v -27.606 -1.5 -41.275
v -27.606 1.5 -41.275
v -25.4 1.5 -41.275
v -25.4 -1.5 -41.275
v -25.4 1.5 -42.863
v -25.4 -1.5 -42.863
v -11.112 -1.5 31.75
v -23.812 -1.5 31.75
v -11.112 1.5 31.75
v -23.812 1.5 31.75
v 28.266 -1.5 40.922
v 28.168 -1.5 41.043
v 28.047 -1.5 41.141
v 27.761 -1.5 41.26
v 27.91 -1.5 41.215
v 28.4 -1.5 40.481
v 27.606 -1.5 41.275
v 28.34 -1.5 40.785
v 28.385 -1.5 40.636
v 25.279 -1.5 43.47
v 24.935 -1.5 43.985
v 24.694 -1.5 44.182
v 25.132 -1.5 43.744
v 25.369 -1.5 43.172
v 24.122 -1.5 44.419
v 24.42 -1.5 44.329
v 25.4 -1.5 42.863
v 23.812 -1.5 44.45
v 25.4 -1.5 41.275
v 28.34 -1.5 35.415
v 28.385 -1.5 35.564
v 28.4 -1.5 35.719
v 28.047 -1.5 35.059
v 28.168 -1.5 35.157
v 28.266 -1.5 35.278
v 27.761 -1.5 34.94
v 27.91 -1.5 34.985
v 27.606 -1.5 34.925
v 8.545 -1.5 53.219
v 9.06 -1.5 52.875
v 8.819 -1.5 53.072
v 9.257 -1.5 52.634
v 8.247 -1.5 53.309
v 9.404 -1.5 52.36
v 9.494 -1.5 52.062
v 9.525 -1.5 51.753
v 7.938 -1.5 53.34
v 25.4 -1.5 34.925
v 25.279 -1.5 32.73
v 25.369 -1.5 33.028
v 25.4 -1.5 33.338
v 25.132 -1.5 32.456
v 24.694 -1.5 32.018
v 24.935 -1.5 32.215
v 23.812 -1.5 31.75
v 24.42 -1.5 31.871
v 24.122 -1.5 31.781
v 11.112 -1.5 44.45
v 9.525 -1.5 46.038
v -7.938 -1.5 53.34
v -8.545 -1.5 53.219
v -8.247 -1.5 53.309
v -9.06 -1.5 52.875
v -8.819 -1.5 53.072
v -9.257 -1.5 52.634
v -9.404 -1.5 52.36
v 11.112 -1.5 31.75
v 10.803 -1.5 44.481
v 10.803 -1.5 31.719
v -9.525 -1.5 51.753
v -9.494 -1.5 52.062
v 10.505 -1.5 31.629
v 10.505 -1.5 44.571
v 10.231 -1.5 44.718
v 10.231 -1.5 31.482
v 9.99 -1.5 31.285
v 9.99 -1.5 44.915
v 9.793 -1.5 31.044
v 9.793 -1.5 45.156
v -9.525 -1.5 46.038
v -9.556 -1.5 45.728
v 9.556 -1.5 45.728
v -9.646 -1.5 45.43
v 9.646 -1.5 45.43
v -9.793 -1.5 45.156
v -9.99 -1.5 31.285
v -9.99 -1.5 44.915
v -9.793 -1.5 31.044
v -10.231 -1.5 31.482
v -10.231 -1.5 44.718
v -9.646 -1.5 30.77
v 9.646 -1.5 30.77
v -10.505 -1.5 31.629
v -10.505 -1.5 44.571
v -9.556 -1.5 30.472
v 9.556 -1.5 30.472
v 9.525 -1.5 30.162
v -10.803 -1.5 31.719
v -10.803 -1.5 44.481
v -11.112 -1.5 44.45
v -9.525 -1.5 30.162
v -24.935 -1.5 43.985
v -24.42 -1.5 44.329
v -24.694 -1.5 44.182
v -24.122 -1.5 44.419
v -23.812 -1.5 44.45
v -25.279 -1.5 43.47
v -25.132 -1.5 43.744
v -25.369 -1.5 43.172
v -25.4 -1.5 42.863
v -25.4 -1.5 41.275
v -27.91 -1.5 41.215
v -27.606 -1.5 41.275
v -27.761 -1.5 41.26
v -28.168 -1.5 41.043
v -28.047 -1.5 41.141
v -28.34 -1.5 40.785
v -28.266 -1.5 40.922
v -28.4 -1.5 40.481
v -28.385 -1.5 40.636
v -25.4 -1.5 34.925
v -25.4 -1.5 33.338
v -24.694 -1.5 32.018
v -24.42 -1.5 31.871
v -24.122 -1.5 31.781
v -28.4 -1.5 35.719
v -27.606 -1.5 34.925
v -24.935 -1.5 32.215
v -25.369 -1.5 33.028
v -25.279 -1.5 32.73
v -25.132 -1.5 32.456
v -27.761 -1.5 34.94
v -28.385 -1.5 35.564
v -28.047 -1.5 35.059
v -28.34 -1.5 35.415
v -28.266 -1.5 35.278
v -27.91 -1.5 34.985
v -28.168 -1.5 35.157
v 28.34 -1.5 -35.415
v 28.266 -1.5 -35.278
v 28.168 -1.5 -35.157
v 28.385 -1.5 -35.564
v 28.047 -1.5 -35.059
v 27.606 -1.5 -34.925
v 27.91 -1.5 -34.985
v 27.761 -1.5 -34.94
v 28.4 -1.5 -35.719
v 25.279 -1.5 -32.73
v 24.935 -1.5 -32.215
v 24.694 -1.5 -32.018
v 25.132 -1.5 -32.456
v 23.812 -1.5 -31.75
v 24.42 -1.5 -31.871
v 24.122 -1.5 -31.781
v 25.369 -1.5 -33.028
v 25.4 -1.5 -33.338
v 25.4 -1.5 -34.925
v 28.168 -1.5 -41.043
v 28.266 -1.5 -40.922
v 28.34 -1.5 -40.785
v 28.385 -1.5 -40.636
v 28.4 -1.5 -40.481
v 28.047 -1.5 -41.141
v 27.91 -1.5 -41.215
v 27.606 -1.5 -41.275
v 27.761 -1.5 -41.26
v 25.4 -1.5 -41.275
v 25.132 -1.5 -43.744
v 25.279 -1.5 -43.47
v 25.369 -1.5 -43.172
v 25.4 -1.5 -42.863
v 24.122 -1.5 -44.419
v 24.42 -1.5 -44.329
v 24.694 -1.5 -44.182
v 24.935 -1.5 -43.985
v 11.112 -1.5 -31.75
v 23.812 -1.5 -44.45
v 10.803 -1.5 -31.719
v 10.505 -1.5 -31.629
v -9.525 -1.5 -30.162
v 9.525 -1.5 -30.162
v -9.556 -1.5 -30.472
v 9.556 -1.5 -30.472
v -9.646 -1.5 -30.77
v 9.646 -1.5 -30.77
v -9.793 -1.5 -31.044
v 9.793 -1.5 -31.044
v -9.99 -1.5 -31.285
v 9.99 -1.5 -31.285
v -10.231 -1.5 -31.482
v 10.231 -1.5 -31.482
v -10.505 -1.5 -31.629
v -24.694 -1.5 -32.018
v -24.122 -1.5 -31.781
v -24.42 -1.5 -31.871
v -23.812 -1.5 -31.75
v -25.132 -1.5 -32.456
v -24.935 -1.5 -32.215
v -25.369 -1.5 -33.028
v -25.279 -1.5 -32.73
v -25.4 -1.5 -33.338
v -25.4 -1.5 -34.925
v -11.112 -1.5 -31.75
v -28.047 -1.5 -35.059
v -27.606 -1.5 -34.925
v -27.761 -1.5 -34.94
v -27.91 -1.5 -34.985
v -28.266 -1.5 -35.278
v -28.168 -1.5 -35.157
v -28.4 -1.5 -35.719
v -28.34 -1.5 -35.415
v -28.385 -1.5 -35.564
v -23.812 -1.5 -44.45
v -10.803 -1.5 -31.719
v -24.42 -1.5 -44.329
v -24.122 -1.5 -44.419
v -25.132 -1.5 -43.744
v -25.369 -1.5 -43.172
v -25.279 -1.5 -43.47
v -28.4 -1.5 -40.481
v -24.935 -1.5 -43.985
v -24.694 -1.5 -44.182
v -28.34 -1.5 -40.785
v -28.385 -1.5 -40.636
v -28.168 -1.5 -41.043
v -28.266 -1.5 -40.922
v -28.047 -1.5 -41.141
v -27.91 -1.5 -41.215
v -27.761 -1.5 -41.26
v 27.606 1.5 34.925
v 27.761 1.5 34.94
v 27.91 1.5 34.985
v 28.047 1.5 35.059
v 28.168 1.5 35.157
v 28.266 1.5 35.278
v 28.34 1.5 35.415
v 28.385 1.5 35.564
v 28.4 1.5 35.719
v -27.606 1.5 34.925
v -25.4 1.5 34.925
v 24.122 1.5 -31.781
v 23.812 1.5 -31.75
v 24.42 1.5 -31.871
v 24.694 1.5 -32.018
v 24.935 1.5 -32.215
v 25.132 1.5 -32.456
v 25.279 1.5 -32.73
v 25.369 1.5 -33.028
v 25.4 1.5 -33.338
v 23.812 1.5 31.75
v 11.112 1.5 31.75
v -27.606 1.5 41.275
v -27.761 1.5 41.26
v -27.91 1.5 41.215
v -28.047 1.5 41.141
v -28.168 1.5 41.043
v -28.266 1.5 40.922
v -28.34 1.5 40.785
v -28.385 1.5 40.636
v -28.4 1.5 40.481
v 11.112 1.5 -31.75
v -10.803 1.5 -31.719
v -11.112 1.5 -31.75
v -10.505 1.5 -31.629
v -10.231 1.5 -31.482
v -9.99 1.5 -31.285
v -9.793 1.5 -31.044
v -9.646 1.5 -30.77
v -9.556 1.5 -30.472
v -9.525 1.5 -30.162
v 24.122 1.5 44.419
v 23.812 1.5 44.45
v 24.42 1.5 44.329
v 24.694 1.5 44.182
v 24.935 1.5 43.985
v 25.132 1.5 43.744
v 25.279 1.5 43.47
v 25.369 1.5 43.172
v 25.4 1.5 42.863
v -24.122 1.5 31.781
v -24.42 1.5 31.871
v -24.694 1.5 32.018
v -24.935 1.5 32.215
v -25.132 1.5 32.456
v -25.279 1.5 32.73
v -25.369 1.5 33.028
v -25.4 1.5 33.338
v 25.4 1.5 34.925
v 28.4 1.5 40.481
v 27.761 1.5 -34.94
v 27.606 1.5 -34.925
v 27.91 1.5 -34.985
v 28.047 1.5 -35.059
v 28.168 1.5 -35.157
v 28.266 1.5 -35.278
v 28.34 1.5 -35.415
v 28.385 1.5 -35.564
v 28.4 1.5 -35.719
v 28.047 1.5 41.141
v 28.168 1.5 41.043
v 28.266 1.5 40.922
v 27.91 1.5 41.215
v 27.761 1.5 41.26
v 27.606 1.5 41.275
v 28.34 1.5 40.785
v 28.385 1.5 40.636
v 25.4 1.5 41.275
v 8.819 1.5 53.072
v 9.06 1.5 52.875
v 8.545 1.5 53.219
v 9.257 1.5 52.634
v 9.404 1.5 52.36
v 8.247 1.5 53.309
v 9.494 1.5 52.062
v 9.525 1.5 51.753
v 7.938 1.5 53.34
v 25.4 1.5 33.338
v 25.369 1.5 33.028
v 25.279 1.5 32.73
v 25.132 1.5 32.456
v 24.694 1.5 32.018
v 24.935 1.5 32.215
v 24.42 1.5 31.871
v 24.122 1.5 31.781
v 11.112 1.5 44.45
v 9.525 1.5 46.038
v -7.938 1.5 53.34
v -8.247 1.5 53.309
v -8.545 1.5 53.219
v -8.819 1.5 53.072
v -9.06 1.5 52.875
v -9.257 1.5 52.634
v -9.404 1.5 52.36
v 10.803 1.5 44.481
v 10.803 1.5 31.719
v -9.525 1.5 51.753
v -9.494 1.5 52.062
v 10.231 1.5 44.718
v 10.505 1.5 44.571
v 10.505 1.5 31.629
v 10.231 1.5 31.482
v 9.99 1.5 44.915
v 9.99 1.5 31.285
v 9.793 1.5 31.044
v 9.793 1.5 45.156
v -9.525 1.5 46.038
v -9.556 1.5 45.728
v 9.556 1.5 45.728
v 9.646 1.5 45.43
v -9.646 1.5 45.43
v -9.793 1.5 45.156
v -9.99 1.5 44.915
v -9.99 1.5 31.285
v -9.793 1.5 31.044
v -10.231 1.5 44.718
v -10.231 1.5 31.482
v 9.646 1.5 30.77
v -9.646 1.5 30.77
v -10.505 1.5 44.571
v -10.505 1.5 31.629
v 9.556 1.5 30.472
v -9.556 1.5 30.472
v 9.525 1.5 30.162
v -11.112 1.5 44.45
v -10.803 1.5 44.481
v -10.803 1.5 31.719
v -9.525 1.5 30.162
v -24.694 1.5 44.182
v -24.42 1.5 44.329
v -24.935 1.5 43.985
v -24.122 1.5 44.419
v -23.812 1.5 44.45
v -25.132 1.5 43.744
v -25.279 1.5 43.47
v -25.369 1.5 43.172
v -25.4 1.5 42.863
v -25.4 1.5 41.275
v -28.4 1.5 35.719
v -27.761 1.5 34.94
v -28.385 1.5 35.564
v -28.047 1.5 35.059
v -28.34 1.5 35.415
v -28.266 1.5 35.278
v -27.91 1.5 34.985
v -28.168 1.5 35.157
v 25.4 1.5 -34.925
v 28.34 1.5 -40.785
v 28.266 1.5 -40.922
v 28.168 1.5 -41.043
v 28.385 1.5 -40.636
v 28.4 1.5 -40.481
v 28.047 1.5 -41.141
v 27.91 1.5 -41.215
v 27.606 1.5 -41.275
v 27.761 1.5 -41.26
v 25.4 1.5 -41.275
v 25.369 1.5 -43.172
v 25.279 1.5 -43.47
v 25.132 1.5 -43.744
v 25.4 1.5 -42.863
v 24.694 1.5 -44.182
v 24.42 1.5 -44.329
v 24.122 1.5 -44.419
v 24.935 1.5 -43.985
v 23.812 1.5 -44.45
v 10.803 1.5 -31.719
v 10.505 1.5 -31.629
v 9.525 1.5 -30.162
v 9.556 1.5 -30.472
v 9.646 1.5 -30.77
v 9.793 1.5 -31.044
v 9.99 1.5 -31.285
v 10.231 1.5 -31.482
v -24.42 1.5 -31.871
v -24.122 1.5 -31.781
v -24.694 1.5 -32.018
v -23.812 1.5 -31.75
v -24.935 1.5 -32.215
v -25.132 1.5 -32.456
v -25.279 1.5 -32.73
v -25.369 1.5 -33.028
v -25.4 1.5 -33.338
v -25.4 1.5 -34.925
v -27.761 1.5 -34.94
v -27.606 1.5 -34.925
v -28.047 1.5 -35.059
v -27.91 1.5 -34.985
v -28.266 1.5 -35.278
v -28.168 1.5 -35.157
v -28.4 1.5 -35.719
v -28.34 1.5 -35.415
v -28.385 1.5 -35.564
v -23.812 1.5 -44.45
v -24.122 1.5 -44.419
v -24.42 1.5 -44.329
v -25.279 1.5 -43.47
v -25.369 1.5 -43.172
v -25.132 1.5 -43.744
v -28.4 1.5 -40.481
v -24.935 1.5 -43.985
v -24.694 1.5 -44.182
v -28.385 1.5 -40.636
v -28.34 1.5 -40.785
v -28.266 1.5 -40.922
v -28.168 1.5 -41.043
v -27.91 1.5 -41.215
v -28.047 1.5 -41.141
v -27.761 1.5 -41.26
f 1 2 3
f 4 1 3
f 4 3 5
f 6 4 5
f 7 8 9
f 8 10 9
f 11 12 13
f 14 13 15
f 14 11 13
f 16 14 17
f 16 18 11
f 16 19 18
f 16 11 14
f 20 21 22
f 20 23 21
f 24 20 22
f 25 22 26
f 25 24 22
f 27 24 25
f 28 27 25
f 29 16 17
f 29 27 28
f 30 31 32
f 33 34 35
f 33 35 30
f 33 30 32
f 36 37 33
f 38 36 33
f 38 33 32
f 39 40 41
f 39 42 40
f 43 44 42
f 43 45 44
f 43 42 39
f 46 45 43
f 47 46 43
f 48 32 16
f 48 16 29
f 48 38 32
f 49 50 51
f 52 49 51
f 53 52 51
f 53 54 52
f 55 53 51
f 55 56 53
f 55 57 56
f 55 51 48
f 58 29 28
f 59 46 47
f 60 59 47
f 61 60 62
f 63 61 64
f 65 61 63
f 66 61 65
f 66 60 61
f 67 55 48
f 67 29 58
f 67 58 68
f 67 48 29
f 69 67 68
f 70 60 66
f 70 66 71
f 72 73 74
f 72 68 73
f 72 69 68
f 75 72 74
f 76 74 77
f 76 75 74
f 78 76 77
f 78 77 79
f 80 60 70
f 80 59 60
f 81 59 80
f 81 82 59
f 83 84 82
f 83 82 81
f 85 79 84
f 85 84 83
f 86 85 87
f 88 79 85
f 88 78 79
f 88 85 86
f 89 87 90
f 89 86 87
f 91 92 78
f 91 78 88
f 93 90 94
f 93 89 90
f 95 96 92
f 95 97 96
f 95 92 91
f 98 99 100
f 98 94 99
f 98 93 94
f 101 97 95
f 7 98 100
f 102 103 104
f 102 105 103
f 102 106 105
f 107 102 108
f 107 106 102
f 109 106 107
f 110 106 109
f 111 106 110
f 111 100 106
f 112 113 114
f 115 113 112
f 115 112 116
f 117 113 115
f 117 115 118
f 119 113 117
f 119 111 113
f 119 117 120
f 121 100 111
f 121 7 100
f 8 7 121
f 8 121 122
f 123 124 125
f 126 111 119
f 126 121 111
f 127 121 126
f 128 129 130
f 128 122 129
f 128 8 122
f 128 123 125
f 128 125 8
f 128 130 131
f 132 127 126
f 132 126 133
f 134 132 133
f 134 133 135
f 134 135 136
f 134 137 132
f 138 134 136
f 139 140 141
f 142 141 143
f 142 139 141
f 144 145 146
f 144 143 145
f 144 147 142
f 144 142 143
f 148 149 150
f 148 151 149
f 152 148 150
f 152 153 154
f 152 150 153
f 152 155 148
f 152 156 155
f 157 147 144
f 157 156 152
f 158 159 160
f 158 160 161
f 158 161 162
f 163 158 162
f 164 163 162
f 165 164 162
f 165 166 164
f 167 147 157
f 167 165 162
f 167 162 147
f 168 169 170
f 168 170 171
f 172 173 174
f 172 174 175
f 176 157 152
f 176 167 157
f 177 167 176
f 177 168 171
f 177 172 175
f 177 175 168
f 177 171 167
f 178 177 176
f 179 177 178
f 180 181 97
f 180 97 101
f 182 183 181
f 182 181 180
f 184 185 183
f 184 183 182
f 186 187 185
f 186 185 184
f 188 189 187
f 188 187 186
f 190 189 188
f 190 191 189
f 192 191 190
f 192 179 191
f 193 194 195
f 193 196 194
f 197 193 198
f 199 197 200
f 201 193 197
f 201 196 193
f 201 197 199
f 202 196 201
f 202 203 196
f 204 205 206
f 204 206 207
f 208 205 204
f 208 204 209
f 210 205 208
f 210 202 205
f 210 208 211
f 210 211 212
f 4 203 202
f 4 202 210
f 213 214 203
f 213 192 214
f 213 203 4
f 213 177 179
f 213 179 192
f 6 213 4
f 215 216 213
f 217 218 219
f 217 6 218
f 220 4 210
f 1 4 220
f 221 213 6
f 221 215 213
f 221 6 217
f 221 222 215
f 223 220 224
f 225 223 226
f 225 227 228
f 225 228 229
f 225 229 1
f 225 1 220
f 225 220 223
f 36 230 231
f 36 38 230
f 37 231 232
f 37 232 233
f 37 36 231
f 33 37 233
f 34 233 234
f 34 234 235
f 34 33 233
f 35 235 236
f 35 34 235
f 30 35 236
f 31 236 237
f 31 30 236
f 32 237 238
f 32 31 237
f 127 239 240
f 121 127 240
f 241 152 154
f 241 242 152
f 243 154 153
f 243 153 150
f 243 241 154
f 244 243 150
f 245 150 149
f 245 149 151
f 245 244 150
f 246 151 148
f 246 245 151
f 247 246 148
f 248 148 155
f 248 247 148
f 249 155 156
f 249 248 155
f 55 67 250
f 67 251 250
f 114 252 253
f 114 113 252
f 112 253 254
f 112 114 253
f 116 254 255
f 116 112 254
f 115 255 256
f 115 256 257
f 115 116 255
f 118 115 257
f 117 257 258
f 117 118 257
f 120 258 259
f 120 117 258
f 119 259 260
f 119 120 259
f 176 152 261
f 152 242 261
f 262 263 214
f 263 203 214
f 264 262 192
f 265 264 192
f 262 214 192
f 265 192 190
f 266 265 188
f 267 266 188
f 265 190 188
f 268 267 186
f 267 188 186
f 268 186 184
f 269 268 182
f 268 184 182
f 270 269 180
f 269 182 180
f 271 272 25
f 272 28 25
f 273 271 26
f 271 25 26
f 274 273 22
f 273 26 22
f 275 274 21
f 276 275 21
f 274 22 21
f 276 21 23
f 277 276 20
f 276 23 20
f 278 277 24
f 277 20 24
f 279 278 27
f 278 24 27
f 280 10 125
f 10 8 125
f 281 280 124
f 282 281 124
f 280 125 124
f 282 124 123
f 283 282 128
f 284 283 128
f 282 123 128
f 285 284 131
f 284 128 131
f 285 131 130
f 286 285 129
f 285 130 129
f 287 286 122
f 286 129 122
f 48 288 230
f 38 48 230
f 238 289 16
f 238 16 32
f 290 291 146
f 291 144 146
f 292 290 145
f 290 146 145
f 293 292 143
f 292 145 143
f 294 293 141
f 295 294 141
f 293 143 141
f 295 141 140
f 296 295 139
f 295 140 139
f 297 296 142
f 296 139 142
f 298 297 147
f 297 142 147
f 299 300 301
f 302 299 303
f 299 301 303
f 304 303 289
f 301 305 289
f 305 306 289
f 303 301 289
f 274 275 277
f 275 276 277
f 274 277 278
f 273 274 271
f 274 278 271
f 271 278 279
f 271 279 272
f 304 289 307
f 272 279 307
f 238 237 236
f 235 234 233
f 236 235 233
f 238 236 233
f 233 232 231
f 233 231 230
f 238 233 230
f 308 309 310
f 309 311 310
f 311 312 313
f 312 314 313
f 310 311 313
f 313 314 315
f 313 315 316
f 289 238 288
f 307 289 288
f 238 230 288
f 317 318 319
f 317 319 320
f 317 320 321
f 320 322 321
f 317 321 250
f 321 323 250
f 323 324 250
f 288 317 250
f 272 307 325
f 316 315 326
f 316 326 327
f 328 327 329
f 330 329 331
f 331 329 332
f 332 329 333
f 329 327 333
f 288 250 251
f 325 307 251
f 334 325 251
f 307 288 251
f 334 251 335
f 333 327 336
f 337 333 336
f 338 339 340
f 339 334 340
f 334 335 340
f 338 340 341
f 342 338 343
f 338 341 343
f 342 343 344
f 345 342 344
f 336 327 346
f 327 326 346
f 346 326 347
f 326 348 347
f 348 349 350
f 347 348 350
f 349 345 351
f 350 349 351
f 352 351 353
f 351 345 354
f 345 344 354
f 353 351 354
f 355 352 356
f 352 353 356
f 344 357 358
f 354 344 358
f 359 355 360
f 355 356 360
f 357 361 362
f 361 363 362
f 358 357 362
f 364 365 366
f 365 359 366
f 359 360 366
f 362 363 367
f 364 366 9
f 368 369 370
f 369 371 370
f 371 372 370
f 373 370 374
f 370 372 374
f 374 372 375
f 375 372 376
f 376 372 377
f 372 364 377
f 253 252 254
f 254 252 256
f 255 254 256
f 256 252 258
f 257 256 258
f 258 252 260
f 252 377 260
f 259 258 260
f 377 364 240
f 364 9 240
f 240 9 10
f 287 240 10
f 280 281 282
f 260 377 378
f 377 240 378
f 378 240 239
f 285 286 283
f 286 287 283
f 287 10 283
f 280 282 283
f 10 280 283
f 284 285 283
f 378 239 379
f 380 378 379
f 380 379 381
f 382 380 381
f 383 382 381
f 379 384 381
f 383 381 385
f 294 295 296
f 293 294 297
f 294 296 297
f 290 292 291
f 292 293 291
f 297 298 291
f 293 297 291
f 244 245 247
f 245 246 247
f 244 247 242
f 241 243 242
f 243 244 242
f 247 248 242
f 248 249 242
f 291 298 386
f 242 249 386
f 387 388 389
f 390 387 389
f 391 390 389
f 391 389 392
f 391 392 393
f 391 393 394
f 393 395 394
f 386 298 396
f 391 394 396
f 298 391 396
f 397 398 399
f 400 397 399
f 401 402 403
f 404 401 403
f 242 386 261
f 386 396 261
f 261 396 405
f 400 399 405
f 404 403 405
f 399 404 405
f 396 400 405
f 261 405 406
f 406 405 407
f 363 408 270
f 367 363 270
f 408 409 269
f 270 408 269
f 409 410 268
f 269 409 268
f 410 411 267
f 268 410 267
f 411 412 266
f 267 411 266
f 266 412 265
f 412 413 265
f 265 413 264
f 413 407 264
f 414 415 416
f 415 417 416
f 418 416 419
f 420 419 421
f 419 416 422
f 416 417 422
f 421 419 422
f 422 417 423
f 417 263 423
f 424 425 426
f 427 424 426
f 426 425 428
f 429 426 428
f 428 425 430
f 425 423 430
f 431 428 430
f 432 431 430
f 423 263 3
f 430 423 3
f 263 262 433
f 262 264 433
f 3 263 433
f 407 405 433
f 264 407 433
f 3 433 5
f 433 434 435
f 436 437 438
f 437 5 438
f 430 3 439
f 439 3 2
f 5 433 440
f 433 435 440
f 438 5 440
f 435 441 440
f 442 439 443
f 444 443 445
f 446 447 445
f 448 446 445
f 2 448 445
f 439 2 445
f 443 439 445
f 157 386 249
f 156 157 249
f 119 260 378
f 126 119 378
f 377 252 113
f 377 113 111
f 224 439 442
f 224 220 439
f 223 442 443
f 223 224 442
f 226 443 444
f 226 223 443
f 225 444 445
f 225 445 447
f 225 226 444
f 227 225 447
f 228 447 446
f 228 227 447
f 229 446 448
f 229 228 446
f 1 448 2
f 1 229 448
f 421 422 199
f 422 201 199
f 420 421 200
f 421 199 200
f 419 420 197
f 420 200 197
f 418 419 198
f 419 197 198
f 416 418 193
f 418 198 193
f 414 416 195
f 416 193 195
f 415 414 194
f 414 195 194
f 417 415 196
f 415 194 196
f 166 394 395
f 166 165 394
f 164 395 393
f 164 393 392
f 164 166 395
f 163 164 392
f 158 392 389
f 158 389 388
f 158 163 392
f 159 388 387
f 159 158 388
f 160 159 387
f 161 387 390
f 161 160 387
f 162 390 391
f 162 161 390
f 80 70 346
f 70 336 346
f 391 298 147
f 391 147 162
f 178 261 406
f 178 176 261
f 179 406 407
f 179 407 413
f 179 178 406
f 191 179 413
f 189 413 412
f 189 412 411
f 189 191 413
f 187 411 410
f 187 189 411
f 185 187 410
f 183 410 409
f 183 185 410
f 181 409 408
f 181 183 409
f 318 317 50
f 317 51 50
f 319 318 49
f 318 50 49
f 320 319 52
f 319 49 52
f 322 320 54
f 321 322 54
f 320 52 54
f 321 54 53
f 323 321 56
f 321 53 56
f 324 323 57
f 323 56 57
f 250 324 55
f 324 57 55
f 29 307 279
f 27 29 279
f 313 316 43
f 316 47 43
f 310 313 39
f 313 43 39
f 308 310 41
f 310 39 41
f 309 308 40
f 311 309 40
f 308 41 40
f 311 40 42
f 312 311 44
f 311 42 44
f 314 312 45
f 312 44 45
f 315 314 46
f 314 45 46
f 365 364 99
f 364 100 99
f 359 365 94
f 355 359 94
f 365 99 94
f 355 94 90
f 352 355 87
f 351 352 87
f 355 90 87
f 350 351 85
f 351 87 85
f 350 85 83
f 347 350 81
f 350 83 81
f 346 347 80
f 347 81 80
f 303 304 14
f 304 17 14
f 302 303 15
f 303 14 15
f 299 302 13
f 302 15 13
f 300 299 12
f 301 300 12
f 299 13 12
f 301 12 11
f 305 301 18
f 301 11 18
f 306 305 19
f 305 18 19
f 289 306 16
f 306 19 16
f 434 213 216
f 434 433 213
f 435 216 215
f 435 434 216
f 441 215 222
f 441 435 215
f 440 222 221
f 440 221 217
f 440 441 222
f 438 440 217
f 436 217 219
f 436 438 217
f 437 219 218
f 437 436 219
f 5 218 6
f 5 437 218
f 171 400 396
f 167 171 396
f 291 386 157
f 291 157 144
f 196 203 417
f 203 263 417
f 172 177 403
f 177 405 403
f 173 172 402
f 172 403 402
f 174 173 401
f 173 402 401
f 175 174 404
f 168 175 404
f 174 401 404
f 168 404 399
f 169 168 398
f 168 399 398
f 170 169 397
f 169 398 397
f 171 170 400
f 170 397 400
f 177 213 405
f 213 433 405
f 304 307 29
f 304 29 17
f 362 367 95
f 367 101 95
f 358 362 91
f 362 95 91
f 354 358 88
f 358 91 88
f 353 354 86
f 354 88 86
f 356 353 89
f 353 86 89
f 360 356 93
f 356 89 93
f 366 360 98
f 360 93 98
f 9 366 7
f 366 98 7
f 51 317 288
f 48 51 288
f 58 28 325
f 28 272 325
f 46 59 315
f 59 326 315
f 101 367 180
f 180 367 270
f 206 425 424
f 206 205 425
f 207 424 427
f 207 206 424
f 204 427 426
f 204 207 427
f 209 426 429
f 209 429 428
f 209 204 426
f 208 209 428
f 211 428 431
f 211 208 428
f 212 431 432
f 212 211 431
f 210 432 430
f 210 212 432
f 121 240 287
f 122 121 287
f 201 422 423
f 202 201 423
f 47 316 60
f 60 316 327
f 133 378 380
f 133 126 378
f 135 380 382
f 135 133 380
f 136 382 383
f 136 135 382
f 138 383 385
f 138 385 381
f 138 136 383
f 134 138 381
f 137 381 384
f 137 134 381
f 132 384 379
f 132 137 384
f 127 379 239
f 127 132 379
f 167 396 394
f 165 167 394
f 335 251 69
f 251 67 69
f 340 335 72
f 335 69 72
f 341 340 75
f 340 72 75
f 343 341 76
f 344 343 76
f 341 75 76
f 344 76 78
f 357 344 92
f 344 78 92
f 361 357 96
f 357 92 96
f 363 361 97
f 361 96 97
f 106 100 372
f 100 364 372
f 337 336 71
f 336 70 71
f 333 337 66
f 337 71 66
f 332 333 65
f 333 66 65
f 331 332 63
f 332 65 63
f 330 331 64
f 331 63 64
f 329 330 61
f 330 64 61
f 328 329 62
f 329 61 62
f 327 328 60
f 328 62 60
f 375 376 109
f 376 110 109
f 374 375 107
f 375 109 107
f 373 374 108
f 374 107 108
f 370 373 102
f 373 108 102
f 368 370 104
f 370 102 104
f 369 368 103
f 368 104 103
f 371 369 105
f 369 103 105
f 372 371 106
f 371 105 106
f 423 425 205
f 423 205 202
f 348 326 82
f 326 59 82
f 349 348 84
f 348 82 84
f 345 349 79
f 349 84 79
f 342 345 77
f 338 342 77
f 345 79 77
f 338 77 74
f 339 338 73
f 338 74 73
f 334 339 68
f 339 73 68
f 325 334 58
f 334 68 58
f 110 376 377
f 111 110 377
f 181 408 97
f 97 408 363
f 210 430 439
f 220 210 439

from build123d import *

# Parameters (mm, degrees)
BOSS_EXTRUDE1_DEPTH = 1.5
FILLET1_R           = 1.5875
SKETCH2_W           = 3
SKETCH2_H           = 6.35
BOSS_EXTRUDE2_DEPTH = 3
FILLET2_R           = 0.79375


with BuildPart() as part:
    # Sketch1 → Boss-Extrude1 (new, symmetric)
    with BuildSketch(Plane(origin=(0, 0, 0), x_dir=(1, 0, 0), z_dir=(0, 1, 0))):
        Polygon((25.4, 31.75), (9.525, 31.75), (9.525, -31.75), (25.4, -31.75), (25.4, -44.45), (9.525, -44.45), (9.525, -53.34), (-9.525, -53.34), (-9.525, -44.45), (-25.4, -44.45), (-25.4, -31.75), (-9.525, -31.75), (-9.525, 31.75), (-25.4, 31.75), (-25.4, 44.45), (25.4, 44.45), align=None)
    extrude(amount=BOSS_EXTRUDE1_DEPTH, both=True)

    # Fillet1
    fillet1_edges = [part.edges().sort_by_distance(p)[0] for p in [
        (25.4, 0, -44.45),
        (25.4, 0, -31.75),
        (9.525, 0, -31.75),
        (9.525, 0, 31.75),
        (25.4, 0, 31.75),
        (25.4, 0, 44.45),
        (9.525, 0, 44.45),
        (9.525, 0, 53.34),
        (-9.525, 0, 53.34),
        (-9.525, 0, 44.45),
        (-25.4, 0, 44.45),
        (-25.4, 0, 31.75),
        (-9.525, 0, 31.75),
        (-9.525, 0, -31.75),
        (-25.4, 0, -31.75),
        (-25.4, 0, -44.45),
    ]]
    fillet(fillet1_edges, radius=FILLET1_R)

    # Sketch2 → Boss-Extrude2 (add)
    with BuildSketch(Plane(origin=(0, 1.5, 0), x_dir=(1, 0, 0), z_dir=(0, 1, 0))):
        with Locations((-26.9, 38.1)):
            Rectangle(SKETCH2_W, SKETCH2_H)
        with Locations((26.9, 38.1)):
            Rectangle(SKETCH2_W, SKETCH2_H)
        with Locations((26.9, -38.1)):
            Rectangle(SKETCH2_W, SKETCH2_H)
        with Locations((-26.9, -38.1)):
            Rectangle(SKETCH2_W, SKETCH2_H)
    extrude(amount=-BOSS_EXTRUDE2_DEPTH)

    # Fillet2
    fillet2_edges = [part.edges().sort_by_distance(p)[0] for p in [
        (-28.4, 0, 41.275),
        (-28.4, 0, 34.925),
        (28.4, 0, 34.925),
        (28.4, 0, 41.275),
        (28.4, 0, -41.275),
        (28.4, 0, -34.925),
        (-28.4, 0, -34.925),
        (-28.4, 0, -41.275),
    ]]
    fillet(fillet2_edges, radius=FILLET2_R)


solid = part.part
